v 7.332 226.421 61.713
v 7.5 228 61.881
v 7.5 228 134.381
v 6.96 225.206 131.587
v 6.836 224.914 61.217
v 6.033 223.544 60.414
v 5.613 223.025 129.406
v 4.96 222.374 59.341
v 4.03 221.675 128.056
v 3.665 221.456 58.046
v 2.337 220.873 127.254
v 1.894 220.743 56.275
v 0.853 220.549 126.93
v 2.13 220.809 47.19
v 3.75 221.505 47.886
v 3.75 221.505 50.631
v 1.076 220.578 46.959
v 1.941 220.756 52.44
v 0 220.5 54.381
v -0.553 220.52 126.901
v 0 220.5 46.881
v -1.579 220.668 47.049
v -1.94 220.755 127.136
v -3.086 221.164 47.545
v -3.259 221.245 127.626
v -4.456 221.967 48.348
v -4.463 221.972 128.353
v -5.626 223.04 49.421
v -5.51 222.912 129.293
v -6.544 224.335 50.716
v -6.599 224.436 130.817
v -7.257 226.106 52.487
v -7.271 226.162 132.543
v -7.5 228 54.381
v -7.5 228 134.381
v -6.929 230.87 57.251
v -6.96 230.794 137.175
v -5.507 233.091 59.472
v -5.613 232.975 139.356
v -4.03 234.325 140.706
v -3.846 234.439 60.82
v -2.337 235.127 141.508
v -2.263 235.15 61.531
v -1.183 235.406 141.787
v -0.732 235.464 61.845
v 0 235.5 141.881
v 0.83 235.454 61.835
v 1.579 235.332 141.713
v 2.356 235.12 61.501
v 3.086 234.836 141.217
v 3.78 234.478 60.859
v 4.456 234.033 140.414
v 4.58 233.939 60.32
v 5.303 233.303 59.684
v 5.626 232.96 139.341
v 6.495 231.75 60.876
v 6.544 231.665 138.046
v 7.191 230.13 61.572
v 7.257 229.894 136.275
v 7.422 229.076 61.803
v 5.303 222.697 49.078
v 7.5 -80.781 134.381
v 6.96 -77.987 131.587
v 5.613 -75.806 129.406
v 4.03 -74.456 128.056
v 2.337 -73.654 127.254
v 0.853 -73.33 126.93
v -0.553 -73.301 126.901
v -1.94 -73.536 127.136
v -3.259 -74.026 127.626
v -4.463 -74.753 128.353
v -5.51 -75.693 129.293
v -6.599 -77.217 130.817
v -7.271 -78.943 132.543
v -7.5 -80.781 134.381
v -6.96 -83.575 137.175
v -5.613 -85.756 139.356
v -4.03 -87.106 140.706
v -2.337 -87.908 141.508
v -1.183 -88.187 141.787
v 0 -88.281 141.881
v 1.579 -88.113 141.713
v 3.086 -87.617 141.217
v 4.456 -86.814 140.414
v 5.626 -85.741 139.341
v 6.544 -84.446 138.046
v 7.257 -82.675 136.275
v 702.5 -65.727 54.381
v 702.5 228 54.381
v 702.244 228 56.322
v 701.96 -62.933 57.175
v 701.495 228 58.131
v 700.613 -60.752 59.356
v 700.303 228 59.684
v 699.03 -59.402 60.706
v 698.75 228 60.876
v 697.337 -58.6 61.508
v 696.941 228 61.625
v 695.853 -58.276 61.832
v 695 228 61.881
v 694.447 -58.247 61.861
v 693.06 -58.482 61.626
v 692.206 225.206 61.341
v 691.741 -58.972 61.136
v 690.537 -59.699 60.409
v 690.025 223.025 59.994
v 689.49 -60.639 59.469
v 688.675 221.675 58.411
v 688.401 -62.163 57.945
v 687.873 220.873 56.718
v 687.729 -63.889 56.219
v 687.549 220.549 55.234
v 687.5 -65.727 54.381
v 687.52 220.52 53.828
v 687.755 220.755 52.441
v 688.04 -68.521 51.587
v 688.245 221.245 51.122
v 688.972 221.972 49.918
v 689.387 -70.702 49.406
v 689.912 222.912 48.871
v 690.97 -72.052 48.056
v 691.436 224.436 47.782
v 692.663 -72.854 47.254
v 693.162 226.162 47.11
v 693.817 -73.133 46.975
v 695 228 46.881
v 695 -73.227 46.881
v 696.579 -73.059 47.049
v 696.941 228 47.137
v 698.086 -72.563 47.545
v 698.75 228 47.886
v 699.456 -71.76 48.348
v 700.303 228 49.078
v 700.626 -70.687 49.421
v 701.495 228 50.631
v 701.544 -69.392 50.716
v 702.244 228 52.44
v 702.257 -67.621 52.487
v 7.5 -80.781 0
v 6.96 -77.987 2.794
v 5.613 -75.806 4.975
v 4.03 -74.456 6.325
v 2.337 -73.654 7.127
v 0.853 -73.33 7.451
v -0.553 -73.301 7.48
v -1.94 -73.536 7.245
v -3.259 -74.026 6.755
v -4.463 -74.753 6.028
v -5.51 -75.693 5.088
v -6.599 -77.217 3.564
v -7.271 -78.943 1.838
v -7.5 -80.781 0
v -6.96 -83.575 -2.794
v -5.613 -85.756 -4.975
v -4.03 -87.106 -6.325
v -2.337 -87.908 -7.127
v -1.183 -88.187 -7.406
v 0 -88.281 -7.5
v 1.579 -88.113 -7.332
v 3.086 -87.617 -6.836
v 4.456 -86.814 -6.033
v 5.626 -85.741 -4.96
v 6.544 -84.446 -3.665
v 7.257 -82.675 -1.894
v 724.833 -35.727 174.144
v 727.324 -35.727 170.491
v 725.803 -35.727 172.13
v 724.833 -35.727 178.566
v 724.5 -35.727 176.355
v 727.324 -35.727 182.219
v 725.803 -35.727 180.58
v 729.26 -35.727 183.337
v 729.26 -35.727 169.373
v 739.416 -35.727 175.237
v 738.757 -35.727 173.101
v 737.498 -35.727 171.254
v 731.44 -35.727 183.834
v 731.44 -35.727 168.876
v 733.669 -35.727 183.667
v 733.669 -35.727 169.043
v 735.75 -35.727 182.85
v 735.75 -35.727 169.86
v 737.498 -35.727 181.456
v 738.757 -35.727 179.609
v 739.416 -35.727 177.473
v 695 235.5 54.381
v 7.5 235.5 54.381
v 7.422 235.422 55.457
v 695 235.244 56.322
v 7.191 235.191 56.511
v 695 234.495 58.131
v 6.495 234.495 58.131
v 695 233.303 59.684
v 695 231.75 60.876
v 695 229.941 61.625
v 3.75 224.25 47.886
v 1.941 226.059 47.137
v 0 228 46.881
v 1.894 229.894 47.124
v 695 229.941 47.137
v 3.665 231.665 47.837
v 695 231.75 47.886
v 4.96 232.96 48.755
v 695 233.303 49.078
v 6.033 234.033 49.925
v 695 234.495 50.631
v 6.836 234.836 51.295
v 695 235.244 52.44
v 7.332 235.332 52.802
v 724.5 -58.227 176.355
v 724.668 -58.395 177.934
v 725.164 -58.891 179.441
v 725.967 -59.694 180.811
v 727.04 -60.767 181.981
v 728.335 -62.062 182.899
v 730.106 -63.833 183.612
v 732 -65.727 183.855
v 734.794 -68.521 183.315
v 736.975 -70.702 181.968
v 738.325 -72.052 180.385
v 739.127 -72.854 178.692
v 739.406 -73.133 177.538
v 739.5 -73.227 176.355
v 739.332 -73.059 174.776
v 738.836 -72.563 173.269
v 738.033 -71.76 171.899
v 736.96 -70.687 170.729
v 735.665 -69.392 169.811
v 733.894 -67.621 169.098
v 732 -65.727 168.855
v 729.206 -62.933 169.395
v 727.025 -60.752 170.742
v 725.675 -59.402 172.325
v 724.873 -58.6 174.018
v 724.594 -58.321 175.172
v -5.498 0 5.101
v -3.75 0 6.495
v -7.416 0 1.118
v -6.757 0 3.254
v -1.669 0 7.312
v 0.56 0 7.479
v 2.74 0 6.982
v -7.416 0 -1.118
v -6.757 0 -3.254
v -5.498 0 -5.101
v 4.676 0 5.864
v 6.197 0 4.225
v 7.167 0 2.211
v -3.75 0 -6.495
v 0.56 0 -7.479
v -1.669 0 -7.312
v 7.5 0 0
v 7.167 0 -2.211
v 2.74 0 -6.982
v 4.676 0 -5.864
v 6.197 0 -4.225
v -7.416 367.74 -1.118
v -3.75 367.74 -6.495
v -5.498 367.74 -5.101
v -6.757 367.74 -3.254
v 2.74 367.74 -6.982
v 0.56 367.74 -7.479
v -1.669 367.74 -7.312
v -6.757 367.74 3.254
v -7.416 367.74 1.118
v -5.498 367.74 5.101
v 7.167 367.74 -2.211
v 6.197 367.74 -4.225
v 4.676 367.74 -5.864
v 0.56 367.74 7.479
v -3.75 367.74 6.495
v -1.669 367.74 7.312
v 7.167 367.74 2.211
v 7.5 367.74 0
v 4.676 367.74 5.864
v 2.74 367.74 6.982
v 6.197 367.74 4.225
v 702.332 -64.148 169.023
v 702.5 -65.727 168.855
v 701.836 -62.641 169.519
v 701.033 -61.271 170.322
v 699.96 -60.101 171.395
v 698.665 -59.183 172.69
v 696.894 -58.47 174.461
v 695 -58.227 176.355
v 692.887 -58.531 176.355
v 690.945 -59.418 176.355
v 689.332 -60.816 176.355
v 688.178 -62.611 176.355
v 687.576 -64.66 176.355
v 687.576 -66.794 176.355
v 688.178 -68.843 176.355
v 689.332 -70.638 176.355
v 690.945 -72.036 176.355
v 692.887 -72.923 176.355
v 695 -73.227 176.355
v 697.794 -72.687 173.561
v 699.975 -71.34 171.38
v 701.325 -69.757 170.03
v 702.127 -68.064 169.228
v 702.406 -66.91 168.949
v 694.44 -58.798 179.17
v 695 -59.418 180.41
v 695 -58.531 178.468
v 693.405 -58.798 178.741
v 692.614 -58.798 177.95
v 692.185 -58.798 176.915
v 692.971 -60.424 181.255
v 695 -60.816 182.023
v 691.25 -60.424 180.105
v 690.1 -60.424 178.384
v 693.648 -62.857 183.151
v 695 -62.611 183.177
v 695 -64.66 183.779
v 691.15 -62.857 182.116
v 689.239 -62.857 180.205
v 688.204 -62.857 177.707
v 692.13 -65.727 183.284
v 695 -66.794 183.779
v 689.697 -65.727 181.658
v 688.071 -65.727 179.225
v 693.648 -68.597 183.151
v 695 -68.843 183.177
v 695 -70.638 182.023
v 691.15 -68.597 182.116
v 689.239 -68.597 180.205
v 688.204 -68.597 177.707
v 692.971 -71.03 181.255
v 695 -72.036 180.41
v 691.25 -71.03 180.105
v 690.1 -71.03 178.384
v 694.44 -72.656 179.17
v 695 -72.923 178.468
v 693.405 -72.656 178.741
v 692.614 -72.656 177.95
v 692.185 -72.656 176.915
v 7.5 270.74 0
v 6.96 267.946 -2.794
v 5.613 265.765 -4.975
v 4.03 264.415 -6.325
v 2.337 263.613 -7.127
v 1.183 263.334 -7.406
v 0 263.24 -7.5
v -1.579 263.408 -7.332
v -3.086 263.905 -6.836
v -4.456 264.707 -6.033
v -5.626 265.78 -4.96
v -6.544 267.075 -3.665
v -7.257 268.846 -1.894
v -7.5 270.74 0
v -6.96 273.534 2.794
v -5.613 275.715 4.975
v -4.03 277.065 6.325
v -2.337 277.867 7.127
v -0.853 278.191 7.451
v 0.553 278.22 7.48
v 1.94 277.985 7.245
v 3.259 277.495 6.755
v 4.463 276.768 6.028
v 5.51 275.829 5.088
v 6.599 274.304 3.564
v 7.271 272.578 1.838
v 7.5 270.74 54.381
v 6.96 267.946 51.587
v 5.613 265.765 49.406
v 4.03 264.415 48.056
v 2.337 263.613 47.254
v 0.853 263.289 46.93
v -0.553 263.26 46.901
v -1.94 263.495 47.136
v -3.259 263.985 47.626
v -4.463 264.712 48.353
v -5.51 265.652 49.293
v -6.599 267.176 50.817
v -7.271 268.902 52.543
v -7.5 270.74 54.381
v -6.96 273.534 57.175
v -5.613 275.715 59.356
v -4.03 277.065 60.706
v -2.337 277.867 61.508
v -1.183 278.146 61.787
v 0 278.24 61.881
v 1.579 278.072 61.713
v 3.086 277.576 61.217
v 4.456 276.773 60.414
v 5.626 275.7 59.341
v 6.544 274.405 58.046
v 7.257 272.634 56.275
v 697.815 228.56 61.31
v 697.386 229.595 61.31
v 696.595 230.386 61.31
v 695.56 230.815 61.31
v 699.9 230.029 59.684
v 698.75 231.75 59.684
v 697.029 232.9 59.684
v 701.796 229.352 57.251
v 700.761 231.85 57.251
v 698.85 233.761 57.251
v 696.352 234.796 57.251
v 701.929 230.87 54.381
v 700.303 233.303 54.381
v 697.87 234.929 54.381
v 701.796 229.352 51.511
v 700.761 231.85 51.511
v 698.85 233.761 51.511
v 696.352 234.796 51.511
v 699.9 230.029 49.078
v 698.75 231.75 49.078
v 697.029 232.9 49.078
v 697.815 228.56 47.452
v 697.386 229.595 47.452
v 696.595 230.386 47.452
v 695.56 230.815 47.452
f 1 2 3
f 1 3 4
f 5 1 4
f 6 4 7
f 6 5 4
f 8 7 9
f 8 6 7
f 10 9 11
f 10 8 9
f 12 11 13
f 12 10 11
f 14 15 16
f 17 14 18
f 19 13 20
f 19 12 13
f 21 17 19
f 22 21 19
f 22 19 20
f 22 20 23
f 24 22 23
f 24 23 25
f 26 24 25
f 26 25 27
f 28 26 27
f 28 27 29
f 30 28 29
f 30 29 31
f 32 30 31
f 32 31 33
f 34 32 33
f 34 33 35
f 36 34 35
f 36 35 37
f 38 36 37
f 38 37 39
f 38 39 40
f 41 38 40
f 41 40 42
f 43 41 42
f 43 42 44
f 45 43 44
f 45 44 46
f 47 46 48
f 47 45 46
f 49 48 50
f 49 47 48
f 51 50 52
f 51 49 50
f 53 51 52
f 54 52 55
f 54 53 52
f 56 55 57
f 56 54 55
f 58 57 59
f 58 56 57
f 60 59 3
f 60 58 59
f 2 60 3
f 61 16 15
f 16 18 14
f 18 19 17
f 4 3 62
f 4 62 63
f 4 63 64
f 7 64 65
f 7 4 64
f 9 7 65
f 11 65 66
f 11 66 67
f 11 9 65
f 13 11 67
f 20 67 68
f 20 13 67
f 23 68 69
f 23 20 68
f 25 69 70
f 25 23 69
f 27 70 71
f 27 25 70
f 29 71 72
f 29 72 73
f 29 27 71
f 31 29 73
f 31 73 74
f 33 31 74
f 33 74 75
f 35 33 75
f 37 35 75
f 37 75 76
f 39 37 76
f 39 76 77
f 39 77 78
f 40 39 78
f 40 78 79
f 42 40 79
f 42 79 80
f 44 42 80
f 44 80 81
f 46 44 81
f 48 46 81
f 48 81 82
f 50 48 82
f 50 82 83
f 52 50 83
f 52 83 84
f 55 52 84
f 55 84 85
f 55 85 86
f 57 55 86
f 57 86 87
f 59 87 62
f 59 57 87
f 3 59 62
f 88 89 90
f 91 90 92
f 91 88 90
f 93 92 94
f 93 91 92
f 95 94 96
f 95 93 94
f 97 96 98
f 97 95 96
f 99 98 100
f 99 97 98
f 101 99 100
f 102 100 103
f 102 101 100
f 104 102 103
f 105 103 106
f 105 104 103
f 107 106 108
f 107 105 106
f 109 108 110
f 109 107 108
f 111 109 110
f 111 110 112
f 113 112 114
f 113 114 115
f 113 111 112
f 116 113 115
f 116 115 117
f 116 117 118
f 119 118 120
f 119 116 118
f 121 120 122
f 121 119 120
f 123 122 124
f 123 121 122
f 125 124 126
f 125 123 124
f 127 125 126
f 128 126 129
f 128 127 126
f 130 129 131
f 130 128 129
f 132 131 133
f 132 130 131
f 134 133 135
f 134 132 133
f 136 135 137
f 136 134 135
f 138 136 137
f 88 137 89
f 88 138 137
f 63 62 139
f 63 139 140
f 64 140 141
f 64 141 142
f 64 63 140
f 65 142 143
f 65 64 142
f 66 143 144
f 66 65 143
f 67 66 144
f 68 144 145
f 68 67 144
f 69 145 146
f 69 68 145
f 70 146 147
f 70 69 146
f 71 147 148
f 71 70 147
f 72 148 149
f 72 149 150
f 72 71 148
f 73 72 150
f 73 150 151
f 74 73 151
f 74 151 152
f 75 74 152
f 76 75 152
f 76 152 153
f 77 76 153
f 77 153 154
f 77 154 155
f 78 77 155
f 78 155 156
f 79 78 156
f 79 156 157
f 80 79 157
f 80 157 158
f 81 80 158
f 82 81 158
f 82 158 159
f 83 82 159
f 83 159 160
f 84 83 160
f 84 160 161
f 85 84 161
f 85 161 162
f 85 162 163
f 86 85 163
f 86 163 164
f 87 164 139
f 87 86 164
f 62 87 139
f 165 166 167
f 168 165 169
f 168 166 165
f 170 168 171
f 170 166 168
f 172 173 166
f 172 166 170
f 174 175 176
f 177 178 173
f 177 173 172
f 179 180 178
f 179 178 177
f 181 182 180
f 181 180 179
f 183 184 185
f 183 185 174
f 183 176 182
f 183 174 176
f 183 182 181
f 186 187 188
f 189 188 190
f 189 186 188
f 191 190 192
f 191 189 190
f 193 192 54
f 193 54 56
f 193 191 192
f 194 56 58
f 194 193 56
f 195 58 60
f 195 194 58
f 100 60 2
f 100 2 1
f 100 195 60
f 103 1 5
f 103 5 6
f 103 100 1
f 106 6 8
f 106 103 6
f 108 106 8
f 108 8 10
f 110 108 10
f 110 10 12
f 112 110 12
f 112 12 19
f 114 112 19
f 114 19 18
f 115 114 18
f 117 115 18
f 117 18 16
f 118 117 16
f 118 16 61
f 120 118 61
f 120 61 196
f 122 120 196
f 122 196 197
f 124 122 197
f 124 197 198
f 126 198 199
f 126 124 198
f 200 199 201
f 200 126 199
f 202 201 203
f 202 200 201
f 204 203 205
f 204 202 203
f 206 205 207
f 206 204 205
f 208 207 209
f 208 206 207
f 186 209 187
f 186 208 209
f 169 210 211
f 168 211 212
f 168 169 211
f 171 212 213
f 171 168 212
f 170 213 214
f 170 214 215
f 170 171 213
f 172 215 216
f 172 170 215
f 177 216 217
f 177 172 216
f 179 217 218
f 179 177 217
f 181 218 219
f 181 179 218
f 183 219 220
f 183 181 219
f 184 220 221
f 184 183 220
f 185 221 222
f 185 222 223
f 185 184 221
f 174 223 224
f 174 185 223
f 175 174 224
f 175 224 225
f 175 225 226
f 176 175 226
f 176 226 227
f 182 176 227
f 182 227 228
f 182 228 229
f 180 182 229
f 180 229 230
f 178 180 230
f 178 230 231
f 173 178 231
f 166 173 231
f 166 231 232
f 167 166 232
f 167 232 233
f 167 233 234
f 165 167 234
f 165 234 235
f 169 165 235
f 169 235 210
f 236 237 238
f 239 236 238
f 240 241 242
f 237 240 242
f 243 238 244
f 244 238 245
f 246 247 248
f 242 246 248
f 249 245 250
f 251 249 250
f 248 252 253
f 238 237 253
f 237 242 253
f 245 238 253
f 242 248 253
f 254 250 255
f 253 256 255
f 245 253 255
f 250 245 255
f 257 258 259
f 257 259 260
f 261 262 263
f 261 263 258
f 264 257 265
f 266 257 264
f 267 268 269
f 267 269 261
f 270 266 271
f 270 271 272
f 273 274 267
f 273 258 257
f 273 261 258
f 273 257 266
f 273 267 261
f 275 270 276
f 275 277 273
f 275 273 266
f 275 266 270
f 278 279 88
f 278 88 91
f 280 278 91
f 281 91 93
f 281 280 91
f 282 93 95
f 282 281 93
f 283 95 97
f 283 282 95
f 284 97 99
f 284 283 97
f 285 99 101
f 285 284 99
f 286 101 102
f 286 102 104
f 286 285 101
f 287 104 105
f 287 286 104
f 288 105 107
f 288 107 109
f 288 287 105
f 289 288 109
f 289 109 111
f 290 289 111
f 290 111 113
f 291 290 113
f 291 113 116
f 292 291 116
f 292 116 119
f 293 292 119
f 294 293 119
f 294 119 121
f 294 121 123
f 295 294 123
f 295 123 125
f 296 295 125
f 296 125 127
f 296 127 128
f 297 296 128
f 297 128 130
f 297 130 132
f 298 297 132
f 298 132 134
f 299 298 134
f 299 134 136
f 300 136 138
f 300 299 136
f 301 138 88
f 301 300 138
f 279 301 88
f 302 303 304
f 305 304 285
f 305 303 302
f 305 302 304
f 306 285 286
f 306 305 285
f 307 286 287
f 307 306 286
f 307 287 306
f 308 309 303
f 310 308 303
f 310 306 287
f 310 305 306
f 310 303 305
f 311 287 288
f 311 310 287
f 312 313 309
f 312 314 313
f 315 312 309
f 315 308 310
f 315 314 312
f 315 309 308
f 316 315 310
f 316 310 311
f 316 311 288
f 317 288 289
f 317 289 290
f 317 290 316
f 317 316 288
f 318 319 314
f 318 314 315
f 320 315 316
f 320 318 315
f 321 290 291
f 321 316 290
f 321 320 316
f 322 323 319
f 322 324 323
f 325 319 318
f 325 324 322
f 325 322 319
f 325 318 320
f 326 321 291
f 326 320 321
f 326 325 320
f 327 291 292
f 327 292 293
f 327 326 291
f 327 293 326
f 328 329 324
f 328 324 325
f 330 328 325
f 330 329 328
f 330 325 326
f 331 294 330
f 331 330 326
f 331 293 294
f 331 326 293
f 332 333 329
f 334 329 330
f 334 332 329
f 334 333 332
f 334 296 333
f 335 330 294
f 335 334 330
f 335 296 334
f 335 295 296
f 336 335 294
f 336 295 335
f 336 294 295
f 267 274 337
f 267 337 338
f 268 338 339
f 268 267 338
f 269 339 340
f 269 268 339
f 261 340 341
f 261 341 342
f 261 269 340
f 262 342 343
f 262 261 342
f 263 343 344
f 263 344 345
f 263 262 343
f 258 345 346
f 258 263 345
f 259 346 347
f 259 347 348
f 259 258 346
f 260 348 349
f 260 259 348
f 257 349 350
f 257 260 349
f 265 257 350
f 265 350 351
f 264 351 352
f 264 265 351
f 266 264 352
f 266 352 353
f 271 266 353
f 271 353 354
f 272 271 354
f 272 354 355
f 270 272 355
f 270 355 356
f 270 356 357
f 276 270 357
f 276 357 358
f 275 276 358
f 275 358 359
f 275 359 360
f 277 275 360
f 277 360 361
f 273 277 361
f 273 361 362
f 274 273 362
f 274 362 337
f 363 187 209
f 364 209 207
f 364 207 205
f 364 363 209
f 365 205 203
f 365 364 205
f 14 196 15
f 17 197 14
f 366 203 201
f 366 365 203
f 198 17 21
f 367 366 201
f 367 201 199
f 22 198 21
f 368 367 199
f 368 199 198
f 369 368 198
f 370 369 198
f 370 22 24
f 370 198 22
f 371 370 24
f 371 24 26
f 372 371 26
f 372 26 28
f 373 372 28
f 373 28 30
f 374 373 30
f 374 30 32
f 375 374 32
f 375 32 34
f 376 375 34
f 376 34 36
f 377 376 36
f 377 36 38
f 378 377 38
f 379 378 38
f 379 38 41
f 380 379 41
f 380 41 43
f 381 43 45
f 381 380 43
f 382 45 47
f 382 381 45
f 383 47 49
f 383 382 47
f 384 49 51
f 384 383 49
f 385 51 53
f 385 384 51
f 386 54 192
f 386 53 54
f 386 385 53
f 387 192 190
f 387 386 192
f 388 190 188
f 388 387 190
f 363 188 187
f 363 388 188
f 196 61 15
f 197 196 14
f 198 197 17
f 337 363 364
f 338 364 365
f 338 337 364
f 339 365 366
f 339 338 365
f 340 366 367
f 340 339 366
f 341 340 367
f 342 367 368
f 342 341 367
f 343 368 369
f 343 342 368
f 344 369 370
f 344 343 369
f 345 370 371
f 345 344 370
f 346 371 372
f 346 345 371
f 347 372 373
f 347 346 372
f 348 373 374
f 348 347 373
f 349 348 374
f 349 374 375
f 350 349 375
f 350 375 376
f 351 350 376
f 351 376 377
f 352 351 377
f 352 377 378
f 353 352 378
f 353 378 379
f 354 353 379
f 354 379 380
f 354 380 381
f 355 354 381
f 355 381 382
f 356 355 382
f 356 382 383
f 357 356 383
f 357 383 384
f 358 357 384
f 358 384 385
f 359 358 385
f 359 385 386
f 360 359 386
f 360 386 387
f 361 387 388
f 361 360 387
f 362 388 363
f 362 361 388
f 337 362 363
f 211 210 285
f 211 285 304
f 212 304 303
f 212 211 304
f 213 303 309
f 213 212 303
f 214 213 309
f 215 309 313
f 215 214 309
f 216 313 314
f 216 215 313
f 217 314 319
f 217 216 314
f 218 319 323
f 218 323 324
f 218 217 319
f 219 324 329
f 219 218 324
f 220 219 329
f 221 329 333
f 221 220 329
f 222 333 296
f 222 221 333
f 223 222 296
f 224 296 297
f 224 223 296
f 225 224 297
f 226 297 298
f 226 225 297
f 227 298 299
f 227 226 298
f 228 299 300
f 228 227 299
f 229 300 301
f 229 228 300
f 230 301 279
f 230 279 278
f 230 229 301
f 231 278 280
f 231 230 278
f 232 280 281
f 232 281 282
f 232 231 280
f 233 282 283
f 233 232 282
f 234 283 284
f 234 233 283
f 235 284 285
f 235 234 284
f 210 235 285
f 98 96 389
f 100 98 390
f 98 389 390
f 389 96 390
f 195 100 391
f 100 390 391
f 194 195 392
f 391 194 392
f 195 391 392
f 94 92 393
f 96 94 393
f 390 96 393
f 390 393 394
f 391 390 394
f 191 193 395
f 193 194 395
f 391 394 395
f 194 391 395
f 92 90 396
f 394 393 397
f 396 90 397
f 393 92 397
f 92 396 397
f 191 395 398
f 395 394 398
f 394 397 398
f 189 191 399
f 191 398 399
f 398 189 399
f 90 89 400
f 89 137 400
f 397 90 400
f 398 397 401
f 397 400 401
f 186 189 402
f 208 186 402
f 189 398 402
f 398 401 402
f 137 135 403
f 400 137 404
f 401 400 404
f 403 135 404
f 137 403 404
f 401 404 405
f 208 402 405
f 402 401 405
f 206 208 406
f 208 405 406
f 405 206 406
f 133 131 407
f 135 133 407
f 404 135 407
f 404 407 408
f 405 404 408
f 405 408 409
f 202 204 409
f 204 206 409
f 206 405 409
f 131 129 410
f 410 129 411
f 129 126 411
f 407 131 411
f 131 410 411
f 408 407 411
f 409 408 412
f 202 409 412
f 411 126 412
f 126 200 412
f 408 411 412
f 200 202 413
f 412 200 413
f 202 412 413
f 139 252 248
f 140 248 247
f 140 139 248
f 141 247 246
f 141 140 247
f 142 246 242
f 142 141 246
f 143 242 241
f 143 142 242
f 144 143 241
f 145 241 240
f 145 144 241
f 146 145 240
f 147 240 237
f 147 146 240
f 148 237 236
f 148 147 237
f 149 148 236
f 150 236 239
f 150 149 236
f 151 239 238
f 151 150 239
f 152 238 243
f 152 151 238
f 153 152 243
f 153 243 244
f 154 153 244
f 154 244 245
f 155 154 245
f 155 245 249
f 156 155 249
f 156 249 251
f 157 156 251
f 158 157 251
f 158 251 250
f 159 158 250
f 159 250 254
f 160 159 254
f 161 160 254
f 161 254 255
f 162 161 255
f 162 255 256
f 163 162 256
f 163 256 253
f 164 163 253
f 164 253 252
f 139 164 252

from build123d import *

# Parameters (mm, degrees)
F0_R  = 7.5
F3_R  = 7.5
F7_R  = 7.5
F11_R = 7.5


with BuildPart() as f2:
    # F2: sweep along a path in F1
    with BuildLine(Plane.YZ) as f2_path:
        Line((0, 0), (-80.781, 0))
        Line((-80.781, 0), (-80.781, 134.381))
        Line((-80.781, 134.381), (228, 134.381))
        Line((228, 134.381), (228, 54.381))
        Line((228, 54.381), (270.740032196, 54.381))
        Line((270.740032196, 54.381), (270.740032196, 0))
        Line((270.740032196, 0), (367.740032196, 0))
    # F0 (on Front) → F2 (sweep)
    with BuildSketch(Plane.XZ):
        Circle(F0_R)
    sweep(path=f2_path.line, transition=Transition.RIGHT)

    # F5: sweep along a path in F4
    with BuildLine(Plane.XZ) as f5_path:
        Line((0, 0), (695, 0))
    # F3 (on Right) → F5 (sweep)
    with BuildSketch(Plane.YZ):
        with Locations((228, 54.381)):
            Circle(F3_R)
    sweep(path=f5_path.line)

    # F9: sweep along a path in F8
    with BuildLine(Plane.YZ) as f9_path:
        Line((228, 54.381), (-65.727, 54.381))
        Line((-65.727, 54.381), (-65.727, 176.355))
    # F7 (on offset) → F9 (sweep)
    with BuildSketch(Plane.XZ.offset(-228)):
        with Locations((695, 54.381)):
            Circle(F7_R)
    sweep(path=f9_path.line, transition=Transition.RIGHT)

    # F13: sweep along a path in F12
    with BuildLine(Plane.XY) as f13_path:
        Line((695, -65.727), (732, -65.727))
        Line((732, -65.727), (732, -35.727))
    # F11 (on offset) → F13 (sweep)
    with BuildSketch(Plane.YZ.offset(695)):
        with Locations((-65.727, 176.355)):
            Circle(F11_R)
    sweep(path=f13_path.line, transition=Transition.RIGHT)

    # F9_face (on face) → F14 (revolve)
    with BuildSketch(Plane(origin=(691.8169011382, -65.727, 176.355), x_dir=(1, 0, 0), z_dir=(0, 0, 1))):
        with BuildLine():
            Line((3.1830988618, -7.5), (3.1830988618, 7.5))
            ThreePointArc((3.1830988618, 7.5), (-4.3169011382, 0), (3.1830988618, -7.5))
        make_face()
    revolve(axis=Axis((695, -65.727, 176.355), (0, -1, 0)))

    # F9_face1 (on face) → F15 (revolve)
    with BuildSketch(Plane(origin=(698.1830988618, 228, 54.381), x_dir=(-1, 0, 0), z_dir=(0, 1, 0))):
        with BuildLine():
            ThreePointArc((-4.3169011382, 0), (-2.1202019971, -5.3033008589), (3.1830988618, -7.5))
            Line((3.1830988618, -7.5), (3.1830988618, 7.5))
            ThreePointArc((3.1830988618, 7.5), (-2.1202019971, 5.3033008589), (-4.3169011382, 0))
        make_face()
    revolve(axis=Axis((695, 228, 54.381), (0, 0, 1)))


solid = f2.part
